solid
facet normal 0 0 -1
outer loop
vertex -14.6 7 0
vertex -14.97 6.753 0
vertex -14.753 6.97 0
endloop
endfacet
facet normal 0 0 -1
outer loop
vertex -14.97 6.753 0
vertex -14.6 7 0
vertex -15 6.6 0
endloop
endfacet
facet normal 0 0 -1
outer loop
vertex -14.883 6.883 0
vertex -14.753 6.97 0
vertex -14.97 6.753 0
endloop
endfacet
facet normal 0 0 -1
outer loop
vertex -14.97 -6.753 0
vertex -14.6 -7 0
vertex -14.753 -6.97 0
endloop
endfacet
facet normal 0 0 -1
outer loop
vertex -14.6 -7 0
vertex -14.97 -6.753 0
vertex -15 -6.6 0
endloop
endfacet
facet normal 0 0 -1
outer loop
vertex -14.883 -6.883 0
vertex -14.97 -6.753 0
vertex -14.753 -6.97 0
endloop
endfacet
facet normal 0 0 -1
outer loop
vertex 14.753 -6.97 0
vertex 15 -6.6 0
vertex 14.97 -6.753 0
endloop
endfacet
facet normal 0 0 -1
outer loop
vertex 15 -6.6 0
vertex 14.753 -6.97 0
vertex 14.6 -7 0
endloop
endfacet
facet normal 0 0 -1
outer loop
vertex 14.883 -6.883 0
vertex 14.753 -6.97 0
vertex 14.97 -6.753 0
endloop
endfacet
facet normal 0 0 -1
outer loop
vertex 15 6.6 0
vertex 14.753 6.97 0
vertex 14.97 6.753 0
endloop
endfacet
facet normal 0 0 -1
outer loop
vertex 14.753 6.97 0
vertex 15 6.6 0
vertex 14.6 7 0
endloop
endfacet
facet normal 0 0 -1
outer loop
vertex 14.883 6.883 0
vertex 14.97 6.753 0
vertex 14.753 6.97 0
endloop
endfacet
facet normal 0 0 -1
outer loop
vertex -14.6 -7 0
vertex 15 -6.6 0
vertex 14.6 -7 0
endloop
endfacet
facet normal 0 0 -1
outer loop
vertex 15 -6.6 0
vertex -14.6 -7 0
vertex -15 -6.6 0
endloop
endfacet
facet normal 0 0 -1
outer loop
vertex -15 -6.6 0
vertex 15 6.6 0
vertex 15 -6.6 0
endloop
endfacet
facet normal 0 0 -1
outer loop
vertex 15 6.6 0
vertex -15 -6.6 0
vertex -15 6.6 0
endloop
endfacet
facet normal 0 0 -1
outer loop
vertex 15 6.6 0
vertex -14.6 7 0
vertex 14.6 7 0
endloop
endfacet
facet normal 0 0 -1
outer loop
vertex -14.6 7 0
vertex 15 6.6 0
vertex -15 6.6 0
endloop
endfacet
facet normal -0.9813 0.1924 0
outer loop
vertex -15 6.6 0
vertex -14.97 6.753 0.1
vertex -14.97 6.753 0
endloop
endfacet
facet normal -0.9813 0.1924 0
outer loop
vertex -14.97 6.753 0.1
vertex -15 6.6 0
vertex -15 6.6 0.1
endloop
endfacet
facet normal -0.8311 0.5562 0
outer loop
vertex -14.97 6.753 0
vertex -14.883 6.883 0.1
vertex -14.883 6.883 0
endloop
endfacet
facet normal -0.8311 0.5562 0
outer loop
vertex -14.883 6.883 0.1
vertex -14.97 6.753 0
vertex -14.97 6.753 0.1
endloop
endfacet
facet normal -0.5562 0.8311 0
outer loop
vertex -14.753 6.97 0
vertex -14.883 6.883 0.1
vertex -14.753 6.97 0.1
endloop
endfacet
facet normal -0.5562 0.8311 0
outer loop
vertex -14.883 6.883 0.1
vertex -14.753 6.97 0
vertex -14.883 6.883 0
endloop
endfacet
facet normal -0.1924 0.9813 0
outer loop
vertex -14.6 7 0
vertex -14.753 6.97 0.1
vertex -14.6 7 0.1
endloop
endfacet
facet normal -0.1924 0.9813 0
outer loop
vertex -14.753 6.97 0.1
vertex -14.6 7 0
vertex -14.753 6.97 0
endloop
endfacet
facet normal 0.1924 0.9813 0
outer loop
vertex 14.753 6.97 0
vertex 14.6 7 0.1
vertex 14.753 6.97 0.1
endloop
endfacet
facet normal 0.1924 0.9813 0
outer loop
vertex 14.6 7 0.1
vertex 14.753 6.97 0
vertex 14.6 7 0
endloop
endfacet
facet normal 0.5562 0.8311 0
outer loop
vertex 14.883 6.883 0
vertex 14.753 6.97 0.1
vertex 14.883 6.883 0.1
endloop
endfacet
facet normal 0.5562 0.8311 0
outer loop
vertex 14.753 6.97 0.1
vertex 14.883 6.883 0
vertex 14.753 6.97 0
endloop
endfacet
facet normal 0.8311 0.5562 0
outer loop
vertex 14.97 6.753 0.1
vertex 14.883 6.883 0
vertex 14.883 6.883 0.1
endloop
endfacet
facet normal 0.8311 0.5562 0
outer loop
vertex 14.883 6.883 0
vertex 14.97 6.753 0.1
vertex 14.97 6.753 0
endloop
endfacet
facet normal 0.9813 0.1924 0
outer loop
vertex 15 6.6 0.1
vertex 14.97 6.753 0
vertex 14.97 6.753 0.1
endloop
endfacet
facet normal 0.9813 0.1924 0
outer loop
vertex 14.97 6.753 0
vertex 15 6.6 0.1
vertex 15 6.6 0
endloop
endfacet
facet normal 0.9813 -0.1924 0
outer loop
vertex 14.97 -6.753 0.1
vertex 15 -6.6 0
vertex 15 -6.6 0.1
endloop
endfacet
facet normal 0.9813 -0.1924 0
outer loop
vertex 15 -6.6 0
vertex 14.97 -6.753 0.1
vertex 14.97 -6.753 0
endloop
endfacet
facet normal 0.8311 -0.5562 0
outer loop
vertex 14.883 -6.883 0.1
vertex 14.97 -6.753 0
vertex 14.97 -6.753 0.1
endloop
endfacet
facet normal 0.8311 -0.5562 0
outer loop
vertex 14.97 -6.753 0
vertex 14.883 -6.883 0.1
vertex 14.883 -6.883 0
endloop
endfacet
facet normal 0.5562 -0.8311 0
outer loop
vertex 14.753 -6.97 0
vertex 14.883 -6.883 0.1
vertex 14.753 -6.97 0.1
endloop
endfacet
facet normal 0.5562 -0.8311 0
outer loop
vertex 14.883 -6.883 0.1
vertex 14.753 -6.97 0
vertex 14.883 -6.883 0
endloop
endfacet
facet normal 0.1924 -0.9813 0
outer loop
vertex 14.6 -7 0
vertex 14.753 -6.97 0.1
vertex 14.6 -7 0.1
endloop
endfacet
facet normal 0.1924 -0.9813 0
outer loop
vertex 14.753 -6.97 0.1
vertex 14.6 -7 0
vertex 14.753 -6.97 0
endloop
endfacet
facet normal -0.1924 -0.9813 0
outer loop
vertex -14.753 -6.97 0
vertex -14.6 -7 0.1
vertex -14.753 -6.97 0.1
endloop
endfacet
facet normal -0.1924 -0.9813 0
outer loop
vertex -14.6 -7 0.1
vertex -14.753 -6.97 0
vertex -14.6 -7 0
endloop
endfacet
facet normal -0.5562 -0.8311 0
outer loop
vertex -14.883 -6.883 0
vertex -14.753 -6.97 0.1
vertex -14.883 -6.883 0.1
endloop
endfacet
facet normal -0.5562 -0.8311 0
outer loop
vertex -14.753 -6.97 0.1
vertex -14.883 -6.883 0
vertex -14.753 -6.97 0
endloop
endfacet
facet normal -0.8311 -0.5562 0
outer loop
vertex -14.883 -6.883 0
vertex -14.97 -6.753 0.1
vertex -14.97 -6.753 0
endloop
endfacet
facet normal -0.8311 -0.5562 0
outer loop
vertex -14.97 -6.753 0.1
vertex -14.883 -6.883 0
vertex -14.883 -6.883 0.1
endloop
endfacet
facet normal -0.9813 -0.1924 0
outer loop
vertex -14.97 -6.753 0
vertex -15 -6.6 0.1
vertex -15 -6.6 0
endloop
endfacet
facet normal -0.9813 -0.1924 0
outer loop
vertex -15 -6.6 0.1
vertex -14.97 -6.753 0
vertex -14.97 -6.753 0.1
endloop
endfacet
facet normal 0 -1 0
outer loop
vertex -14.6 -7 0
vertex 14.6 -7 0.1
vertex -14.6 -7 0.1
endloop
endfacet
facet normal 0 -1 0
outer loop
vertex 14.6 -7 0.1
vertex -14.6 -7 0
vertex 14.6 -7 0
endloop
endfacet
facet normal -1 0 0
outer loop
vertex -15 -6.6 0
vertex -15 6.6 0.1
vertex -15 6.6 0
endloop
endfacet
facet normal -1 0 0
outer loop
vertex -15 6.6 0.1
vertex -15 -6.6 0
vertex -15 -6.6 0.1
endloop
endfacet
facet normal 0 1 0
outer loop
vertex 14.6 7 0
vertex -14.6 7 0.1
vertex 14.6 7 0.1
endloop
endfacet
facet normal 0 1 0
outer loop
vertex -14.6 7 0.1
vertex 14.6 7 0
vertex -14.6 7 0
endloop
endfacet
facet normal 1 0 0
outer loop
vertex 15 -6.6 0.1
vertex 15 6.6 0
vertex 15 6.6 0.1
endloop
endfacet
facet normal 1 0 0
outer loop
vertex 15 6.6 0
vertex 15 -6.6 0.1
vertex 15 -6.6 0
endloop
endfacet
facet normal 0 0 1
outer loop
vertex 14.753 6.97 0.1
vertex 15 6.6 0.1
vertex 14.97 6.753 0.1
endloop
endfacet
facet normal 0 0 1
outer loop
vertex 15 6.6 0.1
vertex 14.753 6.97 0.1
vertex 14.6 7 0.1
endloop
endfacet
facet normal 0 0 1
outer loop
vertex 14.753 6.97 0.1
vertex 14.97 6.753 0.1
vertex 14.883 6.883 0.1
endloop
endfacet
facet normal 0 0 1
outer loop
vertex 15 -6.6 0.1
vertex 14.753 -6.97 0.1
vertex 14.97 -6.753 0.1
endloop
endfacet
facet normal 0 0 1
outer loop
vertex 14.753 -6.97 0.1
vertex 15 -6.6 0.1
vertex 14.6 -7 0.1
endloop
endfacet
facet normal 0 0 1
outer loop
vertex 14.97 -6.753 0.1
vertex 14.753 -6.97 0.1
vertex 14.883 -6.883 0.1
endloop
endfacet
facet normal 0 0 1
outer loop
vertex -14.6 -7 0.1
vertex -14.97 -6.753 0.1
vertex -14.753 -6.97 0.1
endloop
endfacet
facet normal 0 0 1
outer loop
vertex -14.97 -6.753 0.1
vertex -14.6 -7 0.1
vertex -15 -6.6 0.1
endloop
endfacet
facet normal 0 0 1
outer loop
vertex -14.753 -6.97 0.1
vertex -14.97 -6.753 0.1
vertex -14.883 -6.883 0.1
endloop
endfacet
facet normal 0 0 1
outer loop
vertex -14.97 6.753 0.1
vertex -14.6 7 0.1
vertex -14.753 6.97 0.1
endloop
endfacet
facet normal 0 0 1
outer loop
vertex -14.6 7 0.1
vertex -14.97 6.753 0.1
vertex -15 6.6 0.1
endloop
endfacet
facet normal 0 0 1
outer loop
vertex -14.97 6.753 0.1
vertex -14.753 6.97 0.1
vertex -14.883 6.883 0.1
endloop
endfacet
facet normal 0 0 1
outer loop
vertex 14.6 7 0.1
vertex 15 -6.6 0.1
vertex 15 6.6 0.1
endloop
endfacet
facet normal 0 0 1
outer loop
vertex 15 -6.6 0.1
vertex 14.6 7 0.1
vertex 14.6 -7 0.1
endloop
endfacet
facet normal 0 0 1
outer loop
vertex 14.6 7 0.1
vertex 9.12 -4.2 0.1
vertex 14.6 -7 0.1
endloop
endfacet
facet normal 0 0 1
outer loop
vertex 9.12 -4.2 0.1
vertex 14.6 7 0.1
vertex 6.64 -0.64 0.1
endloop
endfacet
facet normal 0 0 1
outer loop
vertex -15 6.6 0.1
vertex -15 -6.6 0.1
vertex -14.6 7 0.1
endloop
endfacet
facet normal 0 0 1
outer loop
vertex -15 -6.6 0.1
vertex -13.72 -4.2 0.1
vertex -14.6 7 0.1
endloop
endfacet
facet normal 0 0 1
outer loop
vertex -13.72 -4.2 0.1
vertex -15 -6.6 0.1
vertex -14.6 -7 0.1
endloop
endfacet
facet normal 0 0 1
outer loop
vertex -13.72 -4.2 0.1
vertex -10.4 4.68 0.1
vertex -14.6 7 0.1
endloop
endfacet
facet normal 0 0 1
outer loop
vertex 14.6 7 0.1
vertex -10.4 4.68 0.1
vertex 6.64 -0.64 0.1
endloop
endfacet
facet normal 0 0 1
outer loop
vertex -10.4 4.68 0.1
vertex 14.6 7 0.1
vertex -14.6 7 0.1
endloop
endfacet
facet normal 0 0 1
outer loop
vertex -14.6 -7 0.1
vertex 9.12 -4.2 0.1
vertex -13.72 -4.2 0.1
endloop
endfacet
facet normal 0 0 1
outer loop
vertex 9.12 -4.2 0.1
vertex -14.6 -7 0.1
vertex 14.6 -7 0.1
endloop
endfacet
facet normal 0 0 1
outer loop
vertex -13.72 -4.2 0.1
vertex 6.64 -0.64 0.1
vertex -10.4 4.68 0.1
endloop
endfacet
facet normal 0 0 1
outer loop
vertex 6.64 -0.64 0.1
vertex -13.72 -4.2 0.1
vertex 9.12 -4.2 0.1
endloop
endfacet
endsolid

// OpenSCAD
// file: ../p/1-4cyli.scad
use <../lib.scad>
function ldraw_lib__1_4cyli() = [
// 0 Cylinder 0.25
// 0 Name: 1-4cyli.dat
// 0 Author: James Jessiman
// 0 !LDRAW_ORG Primitive UPDATE 2012-01
// 0 !LICENSE Licensed under CC BY 4.0 : see CAreadme.txt
// 
// 0 BFC CERTIFY CCW
  [0,"BFC","CERTIFY"],
  [0,"BFC","CCW"],
// 
// 0 !HISTORY 2002-03-23 [sbliss] Added BFC statement.
// 0 !HISTORY 2002-04-25 [PTadmin] Official Update 2002-02
// 0 !HISTORY 2007-06-22 [PTadmin] Header formatted for Contributor Agreement
// 0 !HISTORY 2008-07-01 [PTadmin] Official Update 2008-01
// 0 !HISTORY 2012-02-16 [Philo] Changed to CCW
// 0 !HISTORY 2012-03-30 [PTadmin] Official Update 2012-01
// 
// 
// 4 16 1 1 0 0.9239 1 0.3827 0.9239 0 0.3827 1 0 0
  [4,16,1,1,0,0.9239,1,0.3827,0.9239,0,0.3827,1,0,0],
// 5 24 1 0 0 1 1 0 0.9239 0 0.3827 1 0 -1
  [5,24,1,0,0,1,1,0,0.9239,0,0.3827,1,0,-1],
// 4 16 0.9239 1 0.3827 0.7071 1 0.7071 0.7071 0 0.7071 0.9239 0 0.3827
  [4,16,0.9239,1,0.3827,0.7071,1,0.7071,0.7071,0,0.7071,0.9239,0,0.3827],
// 5 24 0.9239 0 0.3827 0.9239 1 0.3827 0.7071 0 0.7071 1 0 0
  [5,24,0.9239,0,0.3827,0.9239,1,0.3827,0.7071,0,0.7071,1,0,0],
// 4 16 0.7071 1 0.7071 0.3827 1 0.9239 0.3827 0 0.9239 0.7071 0 0.7071
  [4,16,0.7071,1,0.7071,0.3827,1,0.9239,0.3827,0,0.9239,0.7071,0,0.7071],
// 5 24 0.7071 0 0.7071 0.7071 1 0.7071 0.3827 0 0.9239 0.9239 0 0.3827
  [5,24,0.7071,0,0.7071,0.7071,1,0.7071,0.3827,0,0.9239,0.9239,0,0.3827],
// 4 16 0.3827 1 0.9239 0 1 1 0 0 1 0.3827 0 0.9239
  [4,16,0.3827,1,0.9239,0,1,1,0,0,1,0.3827,0,0.9239],
// 5 24 0.3827 0 0.9239 0.3827 1 0.9239 0 0 1 0.7071 0 0.7071
  [5,24,0.3827,0,0.9239,0.3827,1,0.9239,0,0,1,0.7071,0,0.7071],
// 5 24 0 0 1 0 1 1 0.3827 0 0.9239 -1 0 1
  [5,24,0,0,1,0,1,1,0.3827,0,0.9239,-1,0,1],
];
module ldraw_lib__1_4cyli(step=0, col=false, unit=2/5, alt=false, line=0.2, solid=!$preview)
    makepoly(ldraw_lib__1_4cyli(), step=step, col=col, unit=unit, alt=alt, line=line, solid=solid);
ldraw_lib__1_4cyli(line=0.2);
// file: ../p/1-4chrd.scad
use <../lib.scad>
function ldraw_lib__1_4chrd() = [
// 0 Chord 0.25
// 0 Name: 1-4chrd.dat
// 0 Author: Max Martin Richter [MMR1988]
// 0 !LDRAW_ORG Primitive UPDATE 2023-05
// 0 !LICENSE Licensed under CC BY 4.0 : see CAreadme.txt
// 
// 0 BFC CERTIFY CCW
  [0,"BFC","CERTIFY"],
  [0,"BFC","CCW"],
// 
// 0 !HISTORY 2004-04-22 [PTadmin] Official Update 2004-02
// 0 !HISTORY 2007-10-09 [PTadmin] Header formatted for Contributor Agreement
// 0 !HISTORY 2008-07-01 [PTadmin] Official Update 2008-01
// 0 !HISTORY 2012-08-02 [MMR1988] Re-creation with PrimGen2 and Rectifier
// 0 !HISTORY 2012-08-09 [PTadmin] Official Update 2012-02
// 0 !HISTORY 2023-10-27 [OrionP] Change author to MMR1988 from hafhead
// 0 !HISTORY 2023-10-31 [OrionP] Official Update 2023-05
// 
// 4 16 0.9239 0 0.3827 0.3827 0 0.9239 0 0 1 1 0 0
  [4,16,0.9239,0,0.3827,0.3827,0,0.9239,0,0,1,1,0,0],
// 3 16 0.7071 0 0.7071 0.3827 0 0.9239 0.9239 0 0.3827
  [3,16,0.7071,0,0.7071,0.3827,0,0.9239,0.9239,0,0.3827],
];
module ldraw_lib__1_4chrd(step=0, col=false, unit=2/5, alt=false, line=0.2, solid=!$preview)
    makepoly(ldraw_lib__1_4chrd(), step=step, col=col, unit=unit, alt=alt, line=line, solid=solid);
ldraw_lib__1_4chrd(line=0.2);
// file: 6347356m.scad
use <../lib.scad>
use <../p/1-4chrd.scad>
use <../p/1-4cyli.scad>
function ldraw_lib__6347356m() = [
// 0 Sticker  1.7 x  3.7 with Bright Light Orange Trapezoid Left
// 0 Name: 6347356m.dat
// 0 Author: Evert-Jan Boer [ejboer]
// 0 !LDRAW_ORG Part UPDATE 2024-06
// 0 !LICENSE Licensed under CC BY 4.0 : see CAreadme.txt
// 
// 0 BFC CERTIFY CCW
  [0,"BFC","CERTIFY"],
  [0,"BFC","CCW"],
// 
// 0 !KEYWORDS Republic Gunship, Set 75309, Star Wars
// 
// 0 !HISTORY 2024-07-29 [OrionP] Official Update 2024-06
// 
// 1 16 36.5 0 16.5 1 0 0 0 -1 0 0 0 1 1-4chrd.dat
  [1,16,36.5,0,16.5,1,0,0,0,-1,0,0,0,1, ldraw_lib__1_4chrd()],
// 1 16 36.5 0 -16.5 0 0 1 0 -1 0 -1 0 0 1-4chrd.dat
  [1,16,36.5,0,-16.5,0,0,1,0,-1,0,-1,0,0, ldraw_lib__1_4chrd()],
// 1 16 -36.5 0 -16.5 -1 0 0 0 -1 0 0 0 -1 1-4chrd.dat
  [1,16,-36.5,0,-16.5,-1,0,0,0,-1,0,0,0,-1, ldraw_lib__1_4chrd()],
// 1 16 -36.5 0 16.5 0 0 -1 0 -1 0 1 0 0 1-4chrd.dat
  [1,16,-36.5,0,16.5,0,0,-1,0,-1,0,1,0,0, ldraw_lib__1_4chrd()],
// 4 16 36.5 0 -17.5 -36.5 0 -17.5 -37.5 0 -16.5 37.5 0 -16.5
  [4,16,36.5,0,-17.5,-36.5,0,-17.5,-37.5,0,-16.5,37.5,0,-16.5],
// 4 16 37.5 0 16.5 37.5 0 -16.5 -37.5 0 -16.5 -37.5 0 16.5
  [4,16,37.5,0,16.5,37.5,0,-16.5,-37.5,0,-16.5,-37.5,0,16.5],
// 4 16 37.5 0 16.5 -37.5 0 16.5 -36.5 0 17.5 36.5 0 17.5
  [4,16,37.5,0,16.5,-37.5,0,16.5,-36.5,0,17.5,36.5,0,17.5],
// 
// 1 16 36.5 -.25 16.5 1 0 0 0 .25 0 0 0 1 1-4cyli.dat
  [1,16,36.5,-.25,16.5,1,0,0,0,.25,0,0,0,1, ldraw_lib__1_4cyli()],
// 1 16 -36.5 -.25 16.5 0 0 -1 0 .25 0 1 0 0 1-4cyli.dat
  [1,16,-36.5,-.25,16.5,0,0,-1,0,.25,0,1,0,0, ldraw_lib__1_4cyli()],
// 1 16 -36.5 -.25 -16.5 -1 0 0 0 .25 0 0 0 -1 1-4cyli.dat
  [1,16,-36.5,-.25,-16.5,-1,0,0,0,.25,0,0,0,-1, ldraw_lib__1_4cyli()],
// 1 16 36.5 -.25 -16.5 0 0 1 0 .25 0 -1 0 0 1-4cyli.dat
  [1,16,36.5,-.25,-16.5,0,0,1,0,.25,0,-1,0,0, ldraw_lib__1_4cyli()],
// 4 16 36.5 -.25 -17.5 -36.5 -.25 -17.5 -36.5 0 -17.5 36.5 0 -17.5
  [4,16,36.5,-.25,-17.5,-36.5,-.25,-17.5,-36.5,0,-17.5,36.5,0,-17.5],
// 4 16 37.5 -.25 16.5 37.5 -.25 -16.5 37.5 0 -16.5 37.5 0 16.5
  [4,16,37.5,-.25,16.5,37.5,-.25,-16.5,37.5,0,-16.5,37.5,0,16.5],
// 4 16 -36.5 -.25 17.5 36.5 -.25 17.5 36.5 0 17.5 -36.5 0 17.5
  [4,16,-36.5,-.25,17.5,36.5,-.25,17.5,36.5,0,17.5,-36.5,0,17.5],
// 4 16 -37.5 -.25 -16.5 -37.5 -.25 16.5 -37.5 0 16.5 -37.5 0 -16.5
  [4,16,-37.5,-.25,-16.5,-37.5,-.25,16.5,-37.5,0,16.5,-37.5,0,-16.5],
// 
// 1 16 -36.5 -.25 16.5 0 0 -1 0 1 0 1 0 0 1-4chrd.dat
  [1,16,-36.5,-.25,16.5,0,0,-1,0,1,0,1,0,0, ldraw_lib__1_4chrd()],
// 1 16 -36.5 -.25 -16.5 -1 0 0 0 1 0 0 0 -1 1-4chrd.dat
  [1,16,-36.5,-.25,-16.5,-1,0,0,0,1,0,0,0,-1, ldraw_lib__1_4chrd()],
// 1 16 36.5 -.25 -16.5 0 0 1 0 1 0 -1 0 0 1-4chrd.dat
  [1,16,36.5,-.25,-16.5,0,0,1,0,1,0,-1,0,0, ldraw_lib__1_4chrd()],
// 1 16 36.5 -.25 16.5 1 0 0 0 1 0 0 0 1 1-4chrd.dat
  [1,16,36.5,-.25,16.5,1,0,0,0,1,0,0,0,1, ldraw_lib__1_4chrd()],
// 4 16 -36.5 -.25 -17.5 -36.5 -.25 17.5 -37.5 -.25 16.5 -37.5 -.25 -16.5
  [4,16,-36.5,-.25,-17.5,-36.5,-.25,17.5,-37.5,-.25,16.5,-37.5,-.25,-16.5],
// 4 16 -16.6 -.25 -1.6 -36.5 -.25 17.5 -36.5 -.25 -17.5 -22.8 -.25 -10.5
  [4,16,-16.6,-.25,-1.6,-36.5,-.25,17.5,-36.5,-.25,-17.5,-22.8,-.25,-10.5],
// 3 16 36.5 -.25 17.5 37.5 -.25 -16.5 37.5 -.25 16.5
  [3,16,36.5,-.25,17.5,37.5,-.25,-16.5,37.5,-.25,16.5],
// 4 16 34.3 -.25 -10.5 36.5 -.25 -17.5 37.5 -.25 -16.5 36.5 -.25 17.5
  [4,16,34.3,-.25,-10.5,36.5,-.25,-17.5,37.5,-.25,-16.5,36.5,-.25,17.5],
// 3 16 36.5 -.25 17.5 26 -.25 11.7 34.3 -.25 -10.5
  [3,16,36.5,-.25,17.5,26,-.25,11.7,34.3,-.25,-10.5],
// 4 16 36.5 -.25 17.5 -36.5 -.25 17.5 -16.6 -.25 -1.6 26 -.25 11.7
  [4,16,36.5,-.25,17.5,-36.5,-.25,17.5,-16.6,-.25,-1.6,26,-.25,11.7],
// 4 16 -22.8 -.25 -10.5 -36.5 -.25 -17.5 36.5 -.25 -17.5 34.3 -.25 -10.5
  [4,16,-22.8,-.25,-10.5,-36.5,-.25,-17.5,36.5,-.25,-17.5,34.3,-.25,-10.5],
// 
// 0 BFC NOCLIP
  [0,"BFC","NOCLIP"],
// 4 191 26 -.25 11.7 -16.6 -.25 -1.6 -22.8 -.25 -10.5 34.3 -.25 -10.5
  [4,191,26,-.25,11.7,-16.6,-.25,-1.6,-22.8,-.25,-10.5,34.3,-.25,-10.5],
];
module ldraw_lib__6347356m(step=0, col=false, unit=2/5, alt=false, line=0.2, solid=!$preview)
    makepoly(ldraw_lib__6347356m(), step=step, col=col, unit=unit, alt=alt, line=line, solid=solid);
ldraw_lib__6347356m(line=0.2);
// main file
use <../lib.scad>
use <6347356m.scad>
function ldraw_lib__6347356o() = [
// 0 Sticker  1.7 x  3.7 with Bright Light Orange Trapezoid Right
// 0 Name: 6347356o.dat
// 0 Author: Evert-Jan Boer [ejboer]
// 0 !LDRAW_ORG Part UPDATE 2024-06
// 0 !LICENSE Licensed under CC BY 4.0 : see CAreadme.txt
// 
// 0 BFC CERTIFY CCW
  [0,"BFC","CERTIFY"],
  [0,"BFC","CCW"],
// 
// 0 !KEYWORDS Republic Gunship, Set 75309, Star Wars
// 
// 0 !HISTORY 2024-07-29 [OrionP] Official Update 2024-06
// 
// 1 16 0 0 0 -1 0 0 0 1 0 0 0 1 6347356m.dat
  [1,16,0,0,0,-1,0,0,0,1,0,0,0,1, ldraw_lib__6347356m()],
];
module ldraw_lib__6347356o(step=0, col=false, unit=2/5, alt=false, line=0.2, solid=!$preview)
    makepoly(ldraw_lib__6347356o(), step=step, col=col, unit=unit, alt=alt, line=line, solid=solid);
ldraw_lib__6347356o(line=0.2);
